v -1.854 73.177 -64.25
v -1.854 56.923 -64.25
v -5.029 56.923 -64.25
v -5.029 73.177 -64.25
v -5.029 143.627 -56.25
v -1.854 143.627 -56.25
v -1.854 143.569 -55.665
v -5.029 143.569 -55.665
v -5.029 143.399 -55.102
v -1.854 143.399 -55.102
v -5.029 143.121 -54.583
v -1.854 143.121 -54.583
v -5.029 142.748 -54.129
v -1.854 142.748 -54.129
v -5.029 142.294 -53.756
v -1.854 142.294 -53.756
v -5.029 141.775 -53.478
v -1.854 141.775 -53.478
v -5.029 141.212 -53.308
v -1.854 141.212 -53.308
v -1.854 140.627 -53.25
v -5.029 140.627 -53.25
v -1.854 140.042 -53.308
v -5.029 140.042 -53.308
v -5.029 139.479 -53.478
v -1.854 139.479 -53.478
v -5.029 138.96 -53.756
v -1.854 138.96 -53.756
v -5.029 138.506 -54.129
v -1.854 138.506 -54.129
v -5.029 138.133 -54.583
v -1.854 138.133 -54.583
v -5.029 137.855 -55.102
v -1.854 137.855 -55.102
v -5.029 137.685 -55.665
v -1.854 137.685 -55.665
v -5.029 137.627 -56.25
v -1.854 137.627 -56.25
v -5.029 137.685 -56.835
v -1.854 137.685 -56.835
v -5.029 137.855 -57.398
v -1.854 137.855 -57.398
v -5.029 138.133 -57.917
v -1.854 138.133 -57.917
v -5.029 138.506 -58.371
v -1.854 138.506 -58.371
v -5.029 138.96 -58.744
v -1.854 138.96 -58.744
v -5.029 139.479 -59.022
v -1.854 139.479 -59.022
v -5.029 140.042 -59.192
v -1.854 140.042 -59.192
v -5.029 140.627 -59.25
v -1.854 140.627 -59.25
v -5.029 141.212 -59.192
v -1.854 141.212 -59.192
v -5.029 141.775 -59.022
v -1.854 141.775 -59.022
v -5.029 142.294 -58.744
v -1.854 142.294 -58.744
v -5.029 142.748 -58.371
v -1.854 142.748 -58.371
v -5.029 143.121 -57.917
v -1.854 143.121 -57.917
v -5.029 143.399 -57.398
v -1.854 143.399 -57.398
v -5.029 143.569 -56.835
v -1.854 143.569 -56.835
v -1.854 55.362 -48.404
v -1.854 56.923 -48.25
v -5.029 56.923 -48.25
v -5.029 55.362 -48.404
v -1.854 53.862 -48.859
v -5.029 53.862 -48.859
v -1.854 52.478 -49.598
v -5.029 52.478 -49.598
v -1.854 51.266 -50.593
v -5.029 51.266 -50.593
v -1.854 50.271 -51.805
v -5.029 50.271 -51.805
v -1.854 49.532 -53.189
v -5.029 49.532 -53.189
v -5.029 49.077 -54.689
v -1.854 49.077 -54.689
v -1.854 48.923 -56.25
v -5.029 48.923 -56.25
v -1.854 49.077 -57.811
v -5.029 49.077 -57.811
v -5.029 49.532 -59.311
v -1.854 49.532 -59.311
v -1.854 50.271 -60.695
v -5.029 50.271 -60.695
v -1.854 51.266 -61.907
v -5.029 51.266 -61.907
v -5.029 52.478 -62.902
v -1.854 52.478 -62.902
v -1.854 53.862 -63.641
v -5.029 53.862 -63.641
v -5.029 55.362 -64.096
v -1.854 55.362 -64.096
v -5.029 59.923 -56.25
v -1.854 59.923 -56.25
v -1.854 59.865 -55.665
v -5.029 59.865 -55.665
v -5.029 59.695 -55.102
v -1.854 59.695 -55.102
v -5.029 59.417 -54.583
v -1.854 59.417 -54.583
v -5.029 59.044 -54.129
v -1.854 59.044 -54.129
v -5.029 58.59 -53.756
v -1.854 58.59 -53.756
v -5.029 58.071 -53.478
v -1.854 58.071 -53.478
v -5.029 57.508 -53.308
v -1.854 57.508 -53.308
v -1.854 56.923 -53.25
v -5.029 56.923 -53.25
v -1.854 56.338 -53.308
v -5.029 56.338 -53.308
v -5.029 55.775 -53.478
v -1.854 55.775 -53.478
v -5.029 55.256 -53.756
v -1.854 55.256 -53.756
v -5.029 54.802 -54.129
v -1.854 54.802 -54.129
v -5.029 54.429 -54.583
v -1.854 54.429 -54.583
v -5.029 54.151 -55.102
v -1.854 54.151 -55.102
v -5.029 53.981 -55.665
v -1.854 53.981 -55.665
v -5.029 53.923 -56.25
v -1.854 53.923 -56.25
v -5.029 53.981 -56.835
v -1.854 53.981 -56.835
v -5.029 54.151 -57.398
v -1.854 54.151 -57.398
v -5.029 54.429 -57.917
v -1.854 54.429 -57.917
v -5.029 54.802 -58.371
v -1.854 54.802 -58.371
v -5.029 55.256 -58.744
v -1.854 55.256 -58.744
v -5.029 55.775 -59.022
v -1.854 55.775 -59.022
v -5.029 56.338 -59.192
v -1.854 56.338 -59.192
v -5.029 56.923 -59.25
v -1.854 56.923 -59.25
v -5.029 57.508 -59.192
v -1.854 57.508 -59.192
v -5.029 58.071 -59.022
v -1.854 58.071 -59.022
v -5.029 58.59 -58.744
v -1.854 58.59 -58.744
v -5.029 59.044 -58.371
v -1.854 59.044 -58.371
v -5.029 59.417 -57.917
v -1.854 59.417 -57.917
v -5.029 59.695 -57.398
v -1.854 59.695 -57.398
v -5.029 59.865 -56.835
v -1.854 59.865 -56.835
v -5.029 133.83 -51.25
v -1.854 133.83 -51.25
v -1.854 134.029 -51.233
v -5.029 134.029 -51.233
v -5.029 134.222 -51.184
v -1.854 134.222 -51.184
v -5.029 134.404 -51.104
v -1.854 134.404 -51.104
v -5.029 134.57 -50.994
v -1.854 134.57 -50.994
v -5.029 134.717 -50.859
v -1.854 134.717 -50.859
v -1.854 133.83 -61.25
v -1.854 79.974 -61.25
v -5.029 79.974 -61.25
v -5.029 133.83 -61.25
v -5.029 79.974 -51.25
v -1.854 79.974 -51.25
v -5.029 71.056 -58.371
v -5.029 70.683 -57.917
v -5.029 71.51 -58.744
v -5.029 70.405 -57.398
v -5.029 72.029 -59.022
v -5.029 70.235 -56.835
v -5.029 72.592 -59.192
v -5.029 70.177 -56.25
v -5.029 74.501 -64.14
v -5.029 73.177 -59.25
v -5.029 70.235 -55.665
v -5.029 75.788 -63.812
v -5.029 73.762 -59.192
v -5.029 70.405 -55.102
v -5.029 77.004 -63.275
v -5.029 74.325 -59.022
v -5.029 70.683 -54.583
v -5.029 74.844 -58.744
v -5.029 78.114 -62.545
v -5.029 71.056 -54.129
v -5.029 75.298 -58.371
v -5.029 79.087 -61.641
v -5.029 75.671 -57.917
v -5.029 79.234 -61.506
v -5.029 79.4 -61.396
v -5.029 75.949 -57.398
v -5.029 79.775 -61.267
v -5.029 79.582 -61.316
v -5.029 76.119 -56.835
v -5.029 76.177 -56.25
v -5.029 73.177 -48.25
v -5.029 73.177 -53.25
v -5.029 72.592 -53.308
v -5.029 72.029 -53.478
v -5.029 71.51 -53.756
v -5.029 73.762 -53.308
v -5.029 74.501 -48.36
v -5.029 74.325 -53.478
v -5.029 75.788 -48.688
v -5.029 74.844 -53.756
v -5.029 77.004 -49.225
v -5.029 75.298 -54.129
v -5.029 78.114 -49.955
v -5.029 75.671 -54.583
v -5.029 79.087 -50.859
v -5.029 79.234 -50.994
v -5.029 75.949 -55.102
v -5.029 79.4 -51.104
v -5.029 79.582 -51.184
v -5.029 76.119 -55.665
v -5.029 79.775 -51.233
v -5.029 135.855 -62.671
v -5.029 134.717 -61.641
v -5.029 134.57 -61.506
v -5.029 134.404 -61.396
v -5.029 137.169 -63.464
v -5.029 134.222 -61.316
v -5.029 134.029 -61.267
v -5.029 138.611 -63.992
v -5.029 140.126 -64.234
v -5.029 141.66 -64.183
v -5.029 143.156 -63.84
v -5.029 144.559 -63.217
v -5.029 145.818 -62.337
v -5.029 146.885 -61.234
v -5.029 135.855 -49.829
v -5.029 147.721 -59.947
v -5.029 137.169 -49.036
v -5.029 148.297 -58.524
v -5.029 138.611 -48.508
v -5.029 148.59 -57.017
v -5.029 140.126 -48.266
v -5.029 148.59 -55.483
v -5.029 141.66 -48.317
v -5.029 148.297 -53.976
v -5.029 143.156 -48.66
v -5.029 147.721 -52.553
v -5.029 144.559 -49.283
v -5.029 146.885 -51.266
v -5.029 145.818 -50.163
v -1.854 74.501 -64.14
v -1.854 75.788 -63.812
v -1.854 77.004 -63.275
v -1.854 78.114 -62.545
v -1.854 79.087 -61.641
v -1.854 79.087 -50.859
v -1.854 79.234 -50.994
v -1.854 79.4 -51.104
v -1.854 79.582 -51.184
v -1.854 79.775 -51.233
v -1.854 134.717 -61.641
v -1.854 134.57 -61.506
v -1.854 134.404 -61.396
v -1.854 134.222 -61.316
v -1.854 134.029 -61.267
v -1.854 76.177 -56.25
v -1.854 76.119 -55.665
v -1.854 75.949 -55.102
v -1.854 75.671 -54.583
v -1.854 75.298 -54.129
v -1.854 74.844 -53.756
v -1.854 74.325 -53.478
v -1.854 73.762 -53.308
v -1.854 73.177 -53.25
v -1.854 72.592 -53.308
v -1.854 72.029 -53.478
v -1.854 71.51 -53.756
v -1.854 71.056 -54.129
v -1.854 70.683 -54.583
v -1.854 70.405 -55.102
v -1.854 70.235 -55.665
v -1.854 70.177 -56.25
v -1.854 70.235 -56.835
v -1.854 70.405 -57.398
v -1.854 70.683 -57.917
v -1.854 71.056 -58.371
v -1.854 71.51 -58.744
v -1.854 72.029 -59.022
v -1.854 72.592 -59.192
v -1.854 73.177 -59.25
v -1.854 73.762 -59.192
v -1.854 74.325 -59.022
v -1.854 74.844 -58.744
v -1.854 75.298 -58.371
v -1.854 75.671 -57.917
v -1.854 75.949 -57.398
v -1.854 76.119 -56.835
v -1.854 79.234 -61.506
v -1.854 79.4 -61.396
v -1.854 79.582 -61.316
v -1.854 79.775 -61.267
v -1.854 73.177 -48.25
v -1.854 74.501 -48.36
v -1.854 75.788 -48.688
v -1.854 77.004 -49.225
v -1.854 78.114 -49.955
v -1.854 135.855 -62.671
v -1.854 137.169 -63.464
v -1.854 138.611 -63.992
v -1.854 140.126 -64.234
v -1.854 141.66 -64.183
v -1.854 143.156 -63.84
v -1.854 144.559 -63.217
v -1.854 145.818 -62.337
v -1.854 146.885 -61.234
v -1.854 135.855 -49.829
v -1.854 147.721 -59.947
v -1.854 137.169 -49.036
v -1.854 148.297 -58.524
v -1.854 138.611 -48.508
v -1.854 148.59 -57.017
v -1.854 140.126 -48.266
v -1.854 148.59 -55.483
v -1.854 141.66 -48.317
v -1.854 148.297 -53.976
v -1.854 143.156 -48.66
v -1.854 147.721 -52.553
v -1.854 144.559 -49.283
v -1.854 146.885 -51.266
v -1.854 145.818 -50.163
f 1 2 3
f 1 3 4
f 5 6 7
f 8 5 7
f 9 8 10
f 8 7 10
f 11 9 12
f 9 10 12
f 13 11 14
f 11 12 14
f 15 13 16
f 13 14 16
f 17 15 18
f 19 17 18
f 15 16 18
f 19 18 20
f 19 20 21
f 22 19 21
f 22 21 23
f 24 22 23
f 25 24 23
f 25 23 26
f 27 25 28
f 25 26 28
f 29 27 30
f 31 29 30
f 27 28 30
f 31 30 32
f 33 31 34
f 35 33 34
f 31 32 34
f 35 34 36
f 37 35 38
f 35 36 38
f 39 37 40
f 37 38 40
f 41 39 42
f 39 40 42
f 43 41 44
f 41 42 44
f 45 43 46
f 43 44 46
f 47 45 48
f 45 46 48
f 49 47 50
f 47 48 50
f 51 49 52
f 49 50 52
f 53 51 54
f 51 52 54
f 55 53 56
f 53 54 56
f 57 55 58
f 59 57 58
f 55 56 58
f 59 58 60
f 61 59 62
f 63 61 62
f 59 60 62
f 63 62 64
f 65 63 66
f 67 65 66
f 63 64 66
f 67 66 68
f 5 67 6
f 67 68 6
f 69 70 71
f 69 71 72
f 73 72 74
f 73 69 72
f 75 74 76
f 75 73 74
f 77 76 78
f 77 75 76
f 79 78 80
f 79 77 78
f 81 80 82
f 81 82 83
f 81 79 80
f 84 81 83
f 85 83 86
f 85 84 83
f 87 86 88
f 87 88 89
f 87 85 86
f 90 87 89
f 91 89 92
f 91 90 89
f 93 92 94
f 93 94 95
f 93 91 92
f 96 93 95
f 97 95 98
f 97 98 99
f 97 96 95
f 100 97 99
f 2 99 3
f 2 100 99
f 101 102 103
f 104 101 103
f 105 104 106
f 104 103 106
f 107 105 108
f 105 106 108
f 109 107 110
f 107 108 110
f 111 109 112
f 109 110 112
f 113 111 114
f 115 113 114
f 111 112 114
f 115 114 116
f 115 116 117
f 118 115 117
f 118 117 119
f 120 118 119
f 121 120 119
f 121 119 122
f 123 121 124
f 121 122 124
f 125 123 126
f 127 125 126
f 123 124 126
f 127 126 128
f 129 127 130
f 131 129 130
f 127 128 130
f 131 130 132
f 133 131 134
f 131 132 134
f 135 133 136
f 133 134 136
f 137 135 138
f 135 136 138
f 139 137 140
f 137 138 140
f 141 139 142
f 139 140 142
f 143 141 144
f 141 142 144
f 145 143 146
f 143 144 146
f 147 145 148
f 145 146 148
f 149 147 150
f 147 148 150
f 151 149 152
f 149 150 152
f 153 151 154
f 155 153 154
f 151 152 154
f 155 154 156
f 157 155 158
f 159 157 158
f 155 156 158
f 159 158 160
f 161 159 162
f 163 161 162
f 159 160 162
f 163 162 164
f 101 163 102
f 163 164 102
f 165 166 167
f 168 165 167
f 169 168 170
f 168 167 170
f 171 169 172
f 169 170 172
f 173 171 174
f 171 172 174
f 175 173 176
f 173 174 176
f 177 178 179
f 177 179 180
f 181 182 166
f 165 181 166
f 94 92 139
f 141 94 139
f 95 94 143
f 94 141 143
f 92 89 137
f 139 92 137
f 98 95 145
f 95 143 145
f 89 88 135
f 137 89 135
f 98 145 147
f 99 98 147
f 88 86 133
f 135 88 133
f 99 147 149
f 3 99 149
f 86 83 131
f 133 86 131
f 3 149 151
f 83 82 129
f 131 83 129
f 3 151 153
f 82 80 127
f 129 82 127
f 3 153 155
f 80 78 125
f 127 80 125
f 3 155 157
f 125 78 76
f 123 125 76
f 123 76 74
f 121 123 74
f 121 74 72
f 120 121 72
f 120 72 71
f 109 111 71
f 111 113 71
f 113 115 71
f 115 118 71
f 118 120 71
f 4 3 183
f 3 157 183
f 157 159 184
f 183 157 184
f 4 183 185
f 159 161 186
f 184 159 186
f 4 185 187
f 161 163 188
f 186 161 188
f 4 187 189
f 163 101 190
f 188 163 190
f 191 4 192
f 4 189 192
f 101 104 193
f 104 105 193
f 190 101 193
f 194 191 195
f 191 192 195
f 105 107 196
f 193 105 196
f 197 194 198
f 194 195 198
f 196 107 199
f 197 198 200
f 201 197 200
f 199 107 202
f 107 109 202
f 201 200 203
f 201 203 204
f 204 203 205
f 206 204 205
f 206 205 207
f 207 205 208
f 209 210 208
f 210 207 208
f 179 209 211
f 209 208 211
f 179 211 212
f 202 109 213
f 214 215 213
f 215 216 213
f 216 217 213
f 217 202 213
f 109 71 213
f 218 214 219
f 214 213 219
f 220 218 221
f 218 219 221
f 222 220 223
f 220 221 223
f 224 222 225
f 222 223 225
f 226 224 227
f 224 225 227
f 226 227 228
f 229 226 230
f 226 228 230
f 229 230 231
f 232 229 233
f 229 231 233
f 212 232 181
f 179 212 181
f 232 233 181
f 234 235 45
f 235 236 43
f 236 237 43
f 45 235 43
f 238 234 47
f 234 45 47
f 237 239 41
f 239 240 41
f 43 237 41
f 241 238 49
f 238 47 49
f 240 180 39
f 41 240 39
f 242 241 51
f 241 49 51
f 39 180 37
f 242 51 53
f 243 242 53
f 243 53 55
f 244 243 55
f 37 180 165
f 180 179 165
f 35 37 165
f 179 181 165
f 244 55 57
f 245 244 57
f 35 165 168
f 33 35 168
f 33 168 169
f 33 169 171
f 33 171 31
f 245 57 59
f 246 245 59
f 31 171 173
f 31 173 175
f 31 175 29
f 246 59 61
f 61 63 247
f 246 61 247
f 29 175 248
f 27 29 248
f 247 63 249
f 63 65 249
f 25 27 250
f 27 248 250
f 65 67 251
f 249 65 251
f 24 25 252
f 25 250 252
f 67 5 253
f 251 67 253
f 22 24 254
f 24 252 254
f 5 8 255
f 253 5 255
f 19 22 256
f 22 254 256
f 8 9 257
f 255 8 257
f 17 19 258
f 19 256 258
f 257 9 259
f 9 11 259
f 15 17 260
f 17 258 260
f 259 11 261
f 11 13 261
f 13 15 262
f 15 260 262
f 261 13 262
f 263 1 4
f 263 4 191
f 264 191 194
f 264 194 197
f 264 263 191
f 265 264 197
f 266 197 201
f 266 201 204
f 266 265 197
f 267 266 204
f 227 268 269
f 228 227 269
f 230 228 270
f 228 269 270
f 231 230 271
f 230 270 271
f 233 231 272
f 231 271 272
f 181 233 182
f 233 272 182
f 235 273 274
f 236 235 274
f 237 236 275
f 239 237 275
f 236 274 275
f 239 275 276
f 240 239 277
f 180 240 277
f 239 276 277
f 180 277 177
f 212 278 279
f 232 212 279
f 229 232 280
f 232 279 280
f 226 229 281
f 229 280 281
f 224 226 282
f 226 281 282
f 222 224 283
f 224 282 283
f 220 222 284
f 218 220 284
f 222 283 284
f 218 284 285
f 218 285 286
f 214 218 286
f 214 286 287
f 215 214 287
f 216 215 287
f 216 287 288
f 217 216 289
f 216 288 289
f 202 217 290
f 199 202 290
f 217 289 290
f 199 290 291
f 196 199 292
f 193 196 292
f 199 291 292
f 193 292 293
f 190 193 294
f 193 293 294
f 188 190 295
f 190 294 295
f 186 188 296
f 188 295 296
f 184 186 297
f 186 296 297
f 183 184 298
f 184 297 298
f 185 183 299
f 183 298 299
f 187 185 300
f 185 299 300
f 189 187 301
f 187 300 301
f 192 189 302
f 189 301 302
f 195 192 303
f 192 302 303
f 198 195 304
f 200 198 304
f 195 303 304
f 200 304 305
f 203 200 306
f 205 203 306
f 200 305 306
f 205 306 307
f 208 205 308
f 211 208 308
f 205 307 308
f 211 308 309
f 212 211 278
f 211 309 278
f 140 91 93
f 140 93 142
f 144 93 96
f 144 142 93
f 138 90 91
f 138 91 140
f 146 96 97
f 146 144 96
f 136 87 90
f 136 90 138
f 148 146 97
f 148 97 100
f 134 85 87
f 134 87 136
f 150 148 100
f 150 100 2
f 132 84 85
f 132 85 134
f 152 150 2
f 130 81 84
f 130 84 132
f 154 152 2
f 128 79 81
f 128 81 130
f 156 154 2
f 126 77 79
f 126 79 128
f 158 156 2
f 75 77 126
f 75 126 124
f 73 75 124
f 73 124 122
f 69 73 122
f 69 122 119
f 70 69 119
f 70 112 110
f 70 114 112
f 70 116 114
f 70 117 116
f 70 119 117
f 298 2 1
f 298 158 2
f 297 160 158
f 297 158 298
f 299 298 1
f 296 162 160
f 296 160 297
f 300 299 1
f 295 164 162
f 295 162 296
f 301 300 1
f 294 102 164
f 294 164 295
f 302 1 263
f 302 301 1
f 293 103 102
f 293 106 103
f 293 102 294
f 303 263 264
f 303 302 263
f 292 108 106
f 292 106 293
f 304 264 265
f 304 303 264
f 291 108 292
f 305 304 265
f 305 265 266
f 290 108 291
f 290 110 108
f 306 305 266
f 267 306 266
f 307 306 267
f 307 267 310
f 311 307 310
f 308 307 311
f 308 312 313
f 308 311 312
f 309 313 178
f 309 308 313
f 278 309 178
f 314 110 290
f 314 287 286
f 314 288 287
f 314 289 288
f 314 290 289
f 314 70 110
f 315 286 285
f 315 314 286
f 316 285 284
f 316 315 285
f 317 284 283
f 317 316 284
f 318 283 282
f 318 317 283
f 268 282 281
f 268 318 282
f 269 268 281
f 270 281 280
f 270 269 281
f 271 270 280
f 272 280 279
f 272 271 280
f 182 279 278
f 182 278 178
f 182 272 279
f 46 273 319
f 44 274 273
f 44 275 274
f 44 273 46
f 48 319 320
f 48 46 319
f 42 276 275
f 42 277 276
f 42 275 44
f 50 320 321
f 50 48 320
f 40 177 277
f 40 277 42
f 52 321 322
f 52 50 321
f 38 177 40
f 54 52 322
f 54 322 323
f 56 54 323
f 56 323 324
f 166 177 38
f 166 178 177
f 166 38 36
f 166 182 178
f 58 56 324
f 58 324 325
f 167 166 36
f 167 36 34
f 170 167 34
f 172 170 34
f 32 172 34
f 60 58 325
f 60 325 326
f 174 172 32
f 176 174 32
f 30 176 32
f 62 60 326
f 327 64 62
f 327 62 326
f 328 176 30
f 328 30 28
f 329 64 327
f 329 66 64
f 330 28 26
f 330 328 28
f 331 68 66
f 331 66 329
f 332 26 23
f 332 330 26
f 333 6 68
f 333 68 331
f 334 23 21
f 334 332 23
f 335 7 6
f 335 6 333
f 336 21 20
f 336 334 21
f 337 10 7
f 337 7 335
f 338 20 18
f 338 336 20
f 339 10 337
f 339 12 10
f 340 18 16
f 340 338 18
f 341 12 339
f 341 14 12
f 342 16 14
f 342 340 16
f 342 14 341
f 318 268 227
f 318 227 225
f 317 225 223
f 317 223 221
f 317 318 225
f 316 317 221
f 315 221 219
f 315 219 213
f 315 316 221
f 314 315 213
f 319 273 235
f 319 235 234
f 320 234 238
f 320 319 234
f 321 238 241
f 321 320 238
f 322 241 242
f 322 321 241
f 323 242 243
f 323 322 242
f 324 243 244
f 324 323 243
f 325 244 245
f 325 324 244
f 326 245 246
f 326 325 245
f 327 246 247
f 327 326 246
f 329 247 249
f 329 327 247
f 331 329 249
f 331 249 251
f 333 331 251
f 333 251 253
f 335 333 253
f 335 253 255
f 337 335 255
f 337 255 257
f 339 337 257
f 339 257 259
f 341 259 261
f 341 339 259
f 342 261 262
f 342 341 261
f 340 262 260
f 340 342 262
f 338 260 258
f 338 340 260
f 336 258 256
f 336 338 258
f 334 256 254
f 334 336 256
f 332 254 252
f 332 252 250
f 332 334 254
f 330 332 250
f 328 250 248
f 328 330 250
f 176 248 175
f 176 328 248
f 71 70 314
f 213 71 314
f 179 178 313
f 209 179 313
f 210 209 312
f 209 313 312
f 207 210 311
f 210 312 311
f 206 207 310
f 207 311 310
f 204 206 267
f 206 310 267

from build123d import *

# Parameters (mm, degrees)
SKETCH_R  = 3
PAD_DEPTH = 3.175


with BuildPart() as part:
    # Sketch (on Face26 of Binder) → Pad (new body)
    with BuildSketch(Plane.YZ.offset(-1.8542)):
        with BuildLine():
            ThreePointArc((56.923, -48.25), (48.923, -56.25), (56.923, -64.25))
            Line((56.923, -64.25), (73.177, -64.25))
            ThreePointArc((73.177, -64.25), (76.407291, -63.568826), (79.087485, -61.641304))
            ThreePointArc((79.974058, -61.25), (79.489514, -61.352176), (79.087485, -61.641304))
            Line((79.974058, -61.25), (133.829942, -61.25))
            ThreePointArc((134.716515, -61.641304), (134.314486, -61.352176), (133.829942, -61.25))
            ThreePointArc((134.716515, -61.641304), (148.627, -56.25), (134.716515, -50.858696))
            ThreePointArc((133.829942, -51.25), (134.314486, -51.147824), (134.716515, -50.858696))
            Line((79.974058, -51.25), (133.829942, -51.25))
            ThreePointArc((79.087485, -50.858696), (79.489514, -51.147824), (79.974058, -51.25))
            ThreePointArc((79.087485, -50.858696), (76.407291, -48.931174), (73.177, -48.25))
            Line((56.923, -48.25), (73.177, -48.25))
        make_face()
        with Locations((56.923, -56.25)):
            Circle(SKETCH_R, mode=Mode.SUBTRACT)
        with Locations((73.177, -56.25)):
            Circle(SKETCH_R, mode=Mode.SUBTRACT)
        with Locations((140.627, -56.25)):
            Circle(SKETCH_R, mode=Mode.SUBTRACT)
    extrude(amount=-PAD_DEPTH)


solid = part.part
